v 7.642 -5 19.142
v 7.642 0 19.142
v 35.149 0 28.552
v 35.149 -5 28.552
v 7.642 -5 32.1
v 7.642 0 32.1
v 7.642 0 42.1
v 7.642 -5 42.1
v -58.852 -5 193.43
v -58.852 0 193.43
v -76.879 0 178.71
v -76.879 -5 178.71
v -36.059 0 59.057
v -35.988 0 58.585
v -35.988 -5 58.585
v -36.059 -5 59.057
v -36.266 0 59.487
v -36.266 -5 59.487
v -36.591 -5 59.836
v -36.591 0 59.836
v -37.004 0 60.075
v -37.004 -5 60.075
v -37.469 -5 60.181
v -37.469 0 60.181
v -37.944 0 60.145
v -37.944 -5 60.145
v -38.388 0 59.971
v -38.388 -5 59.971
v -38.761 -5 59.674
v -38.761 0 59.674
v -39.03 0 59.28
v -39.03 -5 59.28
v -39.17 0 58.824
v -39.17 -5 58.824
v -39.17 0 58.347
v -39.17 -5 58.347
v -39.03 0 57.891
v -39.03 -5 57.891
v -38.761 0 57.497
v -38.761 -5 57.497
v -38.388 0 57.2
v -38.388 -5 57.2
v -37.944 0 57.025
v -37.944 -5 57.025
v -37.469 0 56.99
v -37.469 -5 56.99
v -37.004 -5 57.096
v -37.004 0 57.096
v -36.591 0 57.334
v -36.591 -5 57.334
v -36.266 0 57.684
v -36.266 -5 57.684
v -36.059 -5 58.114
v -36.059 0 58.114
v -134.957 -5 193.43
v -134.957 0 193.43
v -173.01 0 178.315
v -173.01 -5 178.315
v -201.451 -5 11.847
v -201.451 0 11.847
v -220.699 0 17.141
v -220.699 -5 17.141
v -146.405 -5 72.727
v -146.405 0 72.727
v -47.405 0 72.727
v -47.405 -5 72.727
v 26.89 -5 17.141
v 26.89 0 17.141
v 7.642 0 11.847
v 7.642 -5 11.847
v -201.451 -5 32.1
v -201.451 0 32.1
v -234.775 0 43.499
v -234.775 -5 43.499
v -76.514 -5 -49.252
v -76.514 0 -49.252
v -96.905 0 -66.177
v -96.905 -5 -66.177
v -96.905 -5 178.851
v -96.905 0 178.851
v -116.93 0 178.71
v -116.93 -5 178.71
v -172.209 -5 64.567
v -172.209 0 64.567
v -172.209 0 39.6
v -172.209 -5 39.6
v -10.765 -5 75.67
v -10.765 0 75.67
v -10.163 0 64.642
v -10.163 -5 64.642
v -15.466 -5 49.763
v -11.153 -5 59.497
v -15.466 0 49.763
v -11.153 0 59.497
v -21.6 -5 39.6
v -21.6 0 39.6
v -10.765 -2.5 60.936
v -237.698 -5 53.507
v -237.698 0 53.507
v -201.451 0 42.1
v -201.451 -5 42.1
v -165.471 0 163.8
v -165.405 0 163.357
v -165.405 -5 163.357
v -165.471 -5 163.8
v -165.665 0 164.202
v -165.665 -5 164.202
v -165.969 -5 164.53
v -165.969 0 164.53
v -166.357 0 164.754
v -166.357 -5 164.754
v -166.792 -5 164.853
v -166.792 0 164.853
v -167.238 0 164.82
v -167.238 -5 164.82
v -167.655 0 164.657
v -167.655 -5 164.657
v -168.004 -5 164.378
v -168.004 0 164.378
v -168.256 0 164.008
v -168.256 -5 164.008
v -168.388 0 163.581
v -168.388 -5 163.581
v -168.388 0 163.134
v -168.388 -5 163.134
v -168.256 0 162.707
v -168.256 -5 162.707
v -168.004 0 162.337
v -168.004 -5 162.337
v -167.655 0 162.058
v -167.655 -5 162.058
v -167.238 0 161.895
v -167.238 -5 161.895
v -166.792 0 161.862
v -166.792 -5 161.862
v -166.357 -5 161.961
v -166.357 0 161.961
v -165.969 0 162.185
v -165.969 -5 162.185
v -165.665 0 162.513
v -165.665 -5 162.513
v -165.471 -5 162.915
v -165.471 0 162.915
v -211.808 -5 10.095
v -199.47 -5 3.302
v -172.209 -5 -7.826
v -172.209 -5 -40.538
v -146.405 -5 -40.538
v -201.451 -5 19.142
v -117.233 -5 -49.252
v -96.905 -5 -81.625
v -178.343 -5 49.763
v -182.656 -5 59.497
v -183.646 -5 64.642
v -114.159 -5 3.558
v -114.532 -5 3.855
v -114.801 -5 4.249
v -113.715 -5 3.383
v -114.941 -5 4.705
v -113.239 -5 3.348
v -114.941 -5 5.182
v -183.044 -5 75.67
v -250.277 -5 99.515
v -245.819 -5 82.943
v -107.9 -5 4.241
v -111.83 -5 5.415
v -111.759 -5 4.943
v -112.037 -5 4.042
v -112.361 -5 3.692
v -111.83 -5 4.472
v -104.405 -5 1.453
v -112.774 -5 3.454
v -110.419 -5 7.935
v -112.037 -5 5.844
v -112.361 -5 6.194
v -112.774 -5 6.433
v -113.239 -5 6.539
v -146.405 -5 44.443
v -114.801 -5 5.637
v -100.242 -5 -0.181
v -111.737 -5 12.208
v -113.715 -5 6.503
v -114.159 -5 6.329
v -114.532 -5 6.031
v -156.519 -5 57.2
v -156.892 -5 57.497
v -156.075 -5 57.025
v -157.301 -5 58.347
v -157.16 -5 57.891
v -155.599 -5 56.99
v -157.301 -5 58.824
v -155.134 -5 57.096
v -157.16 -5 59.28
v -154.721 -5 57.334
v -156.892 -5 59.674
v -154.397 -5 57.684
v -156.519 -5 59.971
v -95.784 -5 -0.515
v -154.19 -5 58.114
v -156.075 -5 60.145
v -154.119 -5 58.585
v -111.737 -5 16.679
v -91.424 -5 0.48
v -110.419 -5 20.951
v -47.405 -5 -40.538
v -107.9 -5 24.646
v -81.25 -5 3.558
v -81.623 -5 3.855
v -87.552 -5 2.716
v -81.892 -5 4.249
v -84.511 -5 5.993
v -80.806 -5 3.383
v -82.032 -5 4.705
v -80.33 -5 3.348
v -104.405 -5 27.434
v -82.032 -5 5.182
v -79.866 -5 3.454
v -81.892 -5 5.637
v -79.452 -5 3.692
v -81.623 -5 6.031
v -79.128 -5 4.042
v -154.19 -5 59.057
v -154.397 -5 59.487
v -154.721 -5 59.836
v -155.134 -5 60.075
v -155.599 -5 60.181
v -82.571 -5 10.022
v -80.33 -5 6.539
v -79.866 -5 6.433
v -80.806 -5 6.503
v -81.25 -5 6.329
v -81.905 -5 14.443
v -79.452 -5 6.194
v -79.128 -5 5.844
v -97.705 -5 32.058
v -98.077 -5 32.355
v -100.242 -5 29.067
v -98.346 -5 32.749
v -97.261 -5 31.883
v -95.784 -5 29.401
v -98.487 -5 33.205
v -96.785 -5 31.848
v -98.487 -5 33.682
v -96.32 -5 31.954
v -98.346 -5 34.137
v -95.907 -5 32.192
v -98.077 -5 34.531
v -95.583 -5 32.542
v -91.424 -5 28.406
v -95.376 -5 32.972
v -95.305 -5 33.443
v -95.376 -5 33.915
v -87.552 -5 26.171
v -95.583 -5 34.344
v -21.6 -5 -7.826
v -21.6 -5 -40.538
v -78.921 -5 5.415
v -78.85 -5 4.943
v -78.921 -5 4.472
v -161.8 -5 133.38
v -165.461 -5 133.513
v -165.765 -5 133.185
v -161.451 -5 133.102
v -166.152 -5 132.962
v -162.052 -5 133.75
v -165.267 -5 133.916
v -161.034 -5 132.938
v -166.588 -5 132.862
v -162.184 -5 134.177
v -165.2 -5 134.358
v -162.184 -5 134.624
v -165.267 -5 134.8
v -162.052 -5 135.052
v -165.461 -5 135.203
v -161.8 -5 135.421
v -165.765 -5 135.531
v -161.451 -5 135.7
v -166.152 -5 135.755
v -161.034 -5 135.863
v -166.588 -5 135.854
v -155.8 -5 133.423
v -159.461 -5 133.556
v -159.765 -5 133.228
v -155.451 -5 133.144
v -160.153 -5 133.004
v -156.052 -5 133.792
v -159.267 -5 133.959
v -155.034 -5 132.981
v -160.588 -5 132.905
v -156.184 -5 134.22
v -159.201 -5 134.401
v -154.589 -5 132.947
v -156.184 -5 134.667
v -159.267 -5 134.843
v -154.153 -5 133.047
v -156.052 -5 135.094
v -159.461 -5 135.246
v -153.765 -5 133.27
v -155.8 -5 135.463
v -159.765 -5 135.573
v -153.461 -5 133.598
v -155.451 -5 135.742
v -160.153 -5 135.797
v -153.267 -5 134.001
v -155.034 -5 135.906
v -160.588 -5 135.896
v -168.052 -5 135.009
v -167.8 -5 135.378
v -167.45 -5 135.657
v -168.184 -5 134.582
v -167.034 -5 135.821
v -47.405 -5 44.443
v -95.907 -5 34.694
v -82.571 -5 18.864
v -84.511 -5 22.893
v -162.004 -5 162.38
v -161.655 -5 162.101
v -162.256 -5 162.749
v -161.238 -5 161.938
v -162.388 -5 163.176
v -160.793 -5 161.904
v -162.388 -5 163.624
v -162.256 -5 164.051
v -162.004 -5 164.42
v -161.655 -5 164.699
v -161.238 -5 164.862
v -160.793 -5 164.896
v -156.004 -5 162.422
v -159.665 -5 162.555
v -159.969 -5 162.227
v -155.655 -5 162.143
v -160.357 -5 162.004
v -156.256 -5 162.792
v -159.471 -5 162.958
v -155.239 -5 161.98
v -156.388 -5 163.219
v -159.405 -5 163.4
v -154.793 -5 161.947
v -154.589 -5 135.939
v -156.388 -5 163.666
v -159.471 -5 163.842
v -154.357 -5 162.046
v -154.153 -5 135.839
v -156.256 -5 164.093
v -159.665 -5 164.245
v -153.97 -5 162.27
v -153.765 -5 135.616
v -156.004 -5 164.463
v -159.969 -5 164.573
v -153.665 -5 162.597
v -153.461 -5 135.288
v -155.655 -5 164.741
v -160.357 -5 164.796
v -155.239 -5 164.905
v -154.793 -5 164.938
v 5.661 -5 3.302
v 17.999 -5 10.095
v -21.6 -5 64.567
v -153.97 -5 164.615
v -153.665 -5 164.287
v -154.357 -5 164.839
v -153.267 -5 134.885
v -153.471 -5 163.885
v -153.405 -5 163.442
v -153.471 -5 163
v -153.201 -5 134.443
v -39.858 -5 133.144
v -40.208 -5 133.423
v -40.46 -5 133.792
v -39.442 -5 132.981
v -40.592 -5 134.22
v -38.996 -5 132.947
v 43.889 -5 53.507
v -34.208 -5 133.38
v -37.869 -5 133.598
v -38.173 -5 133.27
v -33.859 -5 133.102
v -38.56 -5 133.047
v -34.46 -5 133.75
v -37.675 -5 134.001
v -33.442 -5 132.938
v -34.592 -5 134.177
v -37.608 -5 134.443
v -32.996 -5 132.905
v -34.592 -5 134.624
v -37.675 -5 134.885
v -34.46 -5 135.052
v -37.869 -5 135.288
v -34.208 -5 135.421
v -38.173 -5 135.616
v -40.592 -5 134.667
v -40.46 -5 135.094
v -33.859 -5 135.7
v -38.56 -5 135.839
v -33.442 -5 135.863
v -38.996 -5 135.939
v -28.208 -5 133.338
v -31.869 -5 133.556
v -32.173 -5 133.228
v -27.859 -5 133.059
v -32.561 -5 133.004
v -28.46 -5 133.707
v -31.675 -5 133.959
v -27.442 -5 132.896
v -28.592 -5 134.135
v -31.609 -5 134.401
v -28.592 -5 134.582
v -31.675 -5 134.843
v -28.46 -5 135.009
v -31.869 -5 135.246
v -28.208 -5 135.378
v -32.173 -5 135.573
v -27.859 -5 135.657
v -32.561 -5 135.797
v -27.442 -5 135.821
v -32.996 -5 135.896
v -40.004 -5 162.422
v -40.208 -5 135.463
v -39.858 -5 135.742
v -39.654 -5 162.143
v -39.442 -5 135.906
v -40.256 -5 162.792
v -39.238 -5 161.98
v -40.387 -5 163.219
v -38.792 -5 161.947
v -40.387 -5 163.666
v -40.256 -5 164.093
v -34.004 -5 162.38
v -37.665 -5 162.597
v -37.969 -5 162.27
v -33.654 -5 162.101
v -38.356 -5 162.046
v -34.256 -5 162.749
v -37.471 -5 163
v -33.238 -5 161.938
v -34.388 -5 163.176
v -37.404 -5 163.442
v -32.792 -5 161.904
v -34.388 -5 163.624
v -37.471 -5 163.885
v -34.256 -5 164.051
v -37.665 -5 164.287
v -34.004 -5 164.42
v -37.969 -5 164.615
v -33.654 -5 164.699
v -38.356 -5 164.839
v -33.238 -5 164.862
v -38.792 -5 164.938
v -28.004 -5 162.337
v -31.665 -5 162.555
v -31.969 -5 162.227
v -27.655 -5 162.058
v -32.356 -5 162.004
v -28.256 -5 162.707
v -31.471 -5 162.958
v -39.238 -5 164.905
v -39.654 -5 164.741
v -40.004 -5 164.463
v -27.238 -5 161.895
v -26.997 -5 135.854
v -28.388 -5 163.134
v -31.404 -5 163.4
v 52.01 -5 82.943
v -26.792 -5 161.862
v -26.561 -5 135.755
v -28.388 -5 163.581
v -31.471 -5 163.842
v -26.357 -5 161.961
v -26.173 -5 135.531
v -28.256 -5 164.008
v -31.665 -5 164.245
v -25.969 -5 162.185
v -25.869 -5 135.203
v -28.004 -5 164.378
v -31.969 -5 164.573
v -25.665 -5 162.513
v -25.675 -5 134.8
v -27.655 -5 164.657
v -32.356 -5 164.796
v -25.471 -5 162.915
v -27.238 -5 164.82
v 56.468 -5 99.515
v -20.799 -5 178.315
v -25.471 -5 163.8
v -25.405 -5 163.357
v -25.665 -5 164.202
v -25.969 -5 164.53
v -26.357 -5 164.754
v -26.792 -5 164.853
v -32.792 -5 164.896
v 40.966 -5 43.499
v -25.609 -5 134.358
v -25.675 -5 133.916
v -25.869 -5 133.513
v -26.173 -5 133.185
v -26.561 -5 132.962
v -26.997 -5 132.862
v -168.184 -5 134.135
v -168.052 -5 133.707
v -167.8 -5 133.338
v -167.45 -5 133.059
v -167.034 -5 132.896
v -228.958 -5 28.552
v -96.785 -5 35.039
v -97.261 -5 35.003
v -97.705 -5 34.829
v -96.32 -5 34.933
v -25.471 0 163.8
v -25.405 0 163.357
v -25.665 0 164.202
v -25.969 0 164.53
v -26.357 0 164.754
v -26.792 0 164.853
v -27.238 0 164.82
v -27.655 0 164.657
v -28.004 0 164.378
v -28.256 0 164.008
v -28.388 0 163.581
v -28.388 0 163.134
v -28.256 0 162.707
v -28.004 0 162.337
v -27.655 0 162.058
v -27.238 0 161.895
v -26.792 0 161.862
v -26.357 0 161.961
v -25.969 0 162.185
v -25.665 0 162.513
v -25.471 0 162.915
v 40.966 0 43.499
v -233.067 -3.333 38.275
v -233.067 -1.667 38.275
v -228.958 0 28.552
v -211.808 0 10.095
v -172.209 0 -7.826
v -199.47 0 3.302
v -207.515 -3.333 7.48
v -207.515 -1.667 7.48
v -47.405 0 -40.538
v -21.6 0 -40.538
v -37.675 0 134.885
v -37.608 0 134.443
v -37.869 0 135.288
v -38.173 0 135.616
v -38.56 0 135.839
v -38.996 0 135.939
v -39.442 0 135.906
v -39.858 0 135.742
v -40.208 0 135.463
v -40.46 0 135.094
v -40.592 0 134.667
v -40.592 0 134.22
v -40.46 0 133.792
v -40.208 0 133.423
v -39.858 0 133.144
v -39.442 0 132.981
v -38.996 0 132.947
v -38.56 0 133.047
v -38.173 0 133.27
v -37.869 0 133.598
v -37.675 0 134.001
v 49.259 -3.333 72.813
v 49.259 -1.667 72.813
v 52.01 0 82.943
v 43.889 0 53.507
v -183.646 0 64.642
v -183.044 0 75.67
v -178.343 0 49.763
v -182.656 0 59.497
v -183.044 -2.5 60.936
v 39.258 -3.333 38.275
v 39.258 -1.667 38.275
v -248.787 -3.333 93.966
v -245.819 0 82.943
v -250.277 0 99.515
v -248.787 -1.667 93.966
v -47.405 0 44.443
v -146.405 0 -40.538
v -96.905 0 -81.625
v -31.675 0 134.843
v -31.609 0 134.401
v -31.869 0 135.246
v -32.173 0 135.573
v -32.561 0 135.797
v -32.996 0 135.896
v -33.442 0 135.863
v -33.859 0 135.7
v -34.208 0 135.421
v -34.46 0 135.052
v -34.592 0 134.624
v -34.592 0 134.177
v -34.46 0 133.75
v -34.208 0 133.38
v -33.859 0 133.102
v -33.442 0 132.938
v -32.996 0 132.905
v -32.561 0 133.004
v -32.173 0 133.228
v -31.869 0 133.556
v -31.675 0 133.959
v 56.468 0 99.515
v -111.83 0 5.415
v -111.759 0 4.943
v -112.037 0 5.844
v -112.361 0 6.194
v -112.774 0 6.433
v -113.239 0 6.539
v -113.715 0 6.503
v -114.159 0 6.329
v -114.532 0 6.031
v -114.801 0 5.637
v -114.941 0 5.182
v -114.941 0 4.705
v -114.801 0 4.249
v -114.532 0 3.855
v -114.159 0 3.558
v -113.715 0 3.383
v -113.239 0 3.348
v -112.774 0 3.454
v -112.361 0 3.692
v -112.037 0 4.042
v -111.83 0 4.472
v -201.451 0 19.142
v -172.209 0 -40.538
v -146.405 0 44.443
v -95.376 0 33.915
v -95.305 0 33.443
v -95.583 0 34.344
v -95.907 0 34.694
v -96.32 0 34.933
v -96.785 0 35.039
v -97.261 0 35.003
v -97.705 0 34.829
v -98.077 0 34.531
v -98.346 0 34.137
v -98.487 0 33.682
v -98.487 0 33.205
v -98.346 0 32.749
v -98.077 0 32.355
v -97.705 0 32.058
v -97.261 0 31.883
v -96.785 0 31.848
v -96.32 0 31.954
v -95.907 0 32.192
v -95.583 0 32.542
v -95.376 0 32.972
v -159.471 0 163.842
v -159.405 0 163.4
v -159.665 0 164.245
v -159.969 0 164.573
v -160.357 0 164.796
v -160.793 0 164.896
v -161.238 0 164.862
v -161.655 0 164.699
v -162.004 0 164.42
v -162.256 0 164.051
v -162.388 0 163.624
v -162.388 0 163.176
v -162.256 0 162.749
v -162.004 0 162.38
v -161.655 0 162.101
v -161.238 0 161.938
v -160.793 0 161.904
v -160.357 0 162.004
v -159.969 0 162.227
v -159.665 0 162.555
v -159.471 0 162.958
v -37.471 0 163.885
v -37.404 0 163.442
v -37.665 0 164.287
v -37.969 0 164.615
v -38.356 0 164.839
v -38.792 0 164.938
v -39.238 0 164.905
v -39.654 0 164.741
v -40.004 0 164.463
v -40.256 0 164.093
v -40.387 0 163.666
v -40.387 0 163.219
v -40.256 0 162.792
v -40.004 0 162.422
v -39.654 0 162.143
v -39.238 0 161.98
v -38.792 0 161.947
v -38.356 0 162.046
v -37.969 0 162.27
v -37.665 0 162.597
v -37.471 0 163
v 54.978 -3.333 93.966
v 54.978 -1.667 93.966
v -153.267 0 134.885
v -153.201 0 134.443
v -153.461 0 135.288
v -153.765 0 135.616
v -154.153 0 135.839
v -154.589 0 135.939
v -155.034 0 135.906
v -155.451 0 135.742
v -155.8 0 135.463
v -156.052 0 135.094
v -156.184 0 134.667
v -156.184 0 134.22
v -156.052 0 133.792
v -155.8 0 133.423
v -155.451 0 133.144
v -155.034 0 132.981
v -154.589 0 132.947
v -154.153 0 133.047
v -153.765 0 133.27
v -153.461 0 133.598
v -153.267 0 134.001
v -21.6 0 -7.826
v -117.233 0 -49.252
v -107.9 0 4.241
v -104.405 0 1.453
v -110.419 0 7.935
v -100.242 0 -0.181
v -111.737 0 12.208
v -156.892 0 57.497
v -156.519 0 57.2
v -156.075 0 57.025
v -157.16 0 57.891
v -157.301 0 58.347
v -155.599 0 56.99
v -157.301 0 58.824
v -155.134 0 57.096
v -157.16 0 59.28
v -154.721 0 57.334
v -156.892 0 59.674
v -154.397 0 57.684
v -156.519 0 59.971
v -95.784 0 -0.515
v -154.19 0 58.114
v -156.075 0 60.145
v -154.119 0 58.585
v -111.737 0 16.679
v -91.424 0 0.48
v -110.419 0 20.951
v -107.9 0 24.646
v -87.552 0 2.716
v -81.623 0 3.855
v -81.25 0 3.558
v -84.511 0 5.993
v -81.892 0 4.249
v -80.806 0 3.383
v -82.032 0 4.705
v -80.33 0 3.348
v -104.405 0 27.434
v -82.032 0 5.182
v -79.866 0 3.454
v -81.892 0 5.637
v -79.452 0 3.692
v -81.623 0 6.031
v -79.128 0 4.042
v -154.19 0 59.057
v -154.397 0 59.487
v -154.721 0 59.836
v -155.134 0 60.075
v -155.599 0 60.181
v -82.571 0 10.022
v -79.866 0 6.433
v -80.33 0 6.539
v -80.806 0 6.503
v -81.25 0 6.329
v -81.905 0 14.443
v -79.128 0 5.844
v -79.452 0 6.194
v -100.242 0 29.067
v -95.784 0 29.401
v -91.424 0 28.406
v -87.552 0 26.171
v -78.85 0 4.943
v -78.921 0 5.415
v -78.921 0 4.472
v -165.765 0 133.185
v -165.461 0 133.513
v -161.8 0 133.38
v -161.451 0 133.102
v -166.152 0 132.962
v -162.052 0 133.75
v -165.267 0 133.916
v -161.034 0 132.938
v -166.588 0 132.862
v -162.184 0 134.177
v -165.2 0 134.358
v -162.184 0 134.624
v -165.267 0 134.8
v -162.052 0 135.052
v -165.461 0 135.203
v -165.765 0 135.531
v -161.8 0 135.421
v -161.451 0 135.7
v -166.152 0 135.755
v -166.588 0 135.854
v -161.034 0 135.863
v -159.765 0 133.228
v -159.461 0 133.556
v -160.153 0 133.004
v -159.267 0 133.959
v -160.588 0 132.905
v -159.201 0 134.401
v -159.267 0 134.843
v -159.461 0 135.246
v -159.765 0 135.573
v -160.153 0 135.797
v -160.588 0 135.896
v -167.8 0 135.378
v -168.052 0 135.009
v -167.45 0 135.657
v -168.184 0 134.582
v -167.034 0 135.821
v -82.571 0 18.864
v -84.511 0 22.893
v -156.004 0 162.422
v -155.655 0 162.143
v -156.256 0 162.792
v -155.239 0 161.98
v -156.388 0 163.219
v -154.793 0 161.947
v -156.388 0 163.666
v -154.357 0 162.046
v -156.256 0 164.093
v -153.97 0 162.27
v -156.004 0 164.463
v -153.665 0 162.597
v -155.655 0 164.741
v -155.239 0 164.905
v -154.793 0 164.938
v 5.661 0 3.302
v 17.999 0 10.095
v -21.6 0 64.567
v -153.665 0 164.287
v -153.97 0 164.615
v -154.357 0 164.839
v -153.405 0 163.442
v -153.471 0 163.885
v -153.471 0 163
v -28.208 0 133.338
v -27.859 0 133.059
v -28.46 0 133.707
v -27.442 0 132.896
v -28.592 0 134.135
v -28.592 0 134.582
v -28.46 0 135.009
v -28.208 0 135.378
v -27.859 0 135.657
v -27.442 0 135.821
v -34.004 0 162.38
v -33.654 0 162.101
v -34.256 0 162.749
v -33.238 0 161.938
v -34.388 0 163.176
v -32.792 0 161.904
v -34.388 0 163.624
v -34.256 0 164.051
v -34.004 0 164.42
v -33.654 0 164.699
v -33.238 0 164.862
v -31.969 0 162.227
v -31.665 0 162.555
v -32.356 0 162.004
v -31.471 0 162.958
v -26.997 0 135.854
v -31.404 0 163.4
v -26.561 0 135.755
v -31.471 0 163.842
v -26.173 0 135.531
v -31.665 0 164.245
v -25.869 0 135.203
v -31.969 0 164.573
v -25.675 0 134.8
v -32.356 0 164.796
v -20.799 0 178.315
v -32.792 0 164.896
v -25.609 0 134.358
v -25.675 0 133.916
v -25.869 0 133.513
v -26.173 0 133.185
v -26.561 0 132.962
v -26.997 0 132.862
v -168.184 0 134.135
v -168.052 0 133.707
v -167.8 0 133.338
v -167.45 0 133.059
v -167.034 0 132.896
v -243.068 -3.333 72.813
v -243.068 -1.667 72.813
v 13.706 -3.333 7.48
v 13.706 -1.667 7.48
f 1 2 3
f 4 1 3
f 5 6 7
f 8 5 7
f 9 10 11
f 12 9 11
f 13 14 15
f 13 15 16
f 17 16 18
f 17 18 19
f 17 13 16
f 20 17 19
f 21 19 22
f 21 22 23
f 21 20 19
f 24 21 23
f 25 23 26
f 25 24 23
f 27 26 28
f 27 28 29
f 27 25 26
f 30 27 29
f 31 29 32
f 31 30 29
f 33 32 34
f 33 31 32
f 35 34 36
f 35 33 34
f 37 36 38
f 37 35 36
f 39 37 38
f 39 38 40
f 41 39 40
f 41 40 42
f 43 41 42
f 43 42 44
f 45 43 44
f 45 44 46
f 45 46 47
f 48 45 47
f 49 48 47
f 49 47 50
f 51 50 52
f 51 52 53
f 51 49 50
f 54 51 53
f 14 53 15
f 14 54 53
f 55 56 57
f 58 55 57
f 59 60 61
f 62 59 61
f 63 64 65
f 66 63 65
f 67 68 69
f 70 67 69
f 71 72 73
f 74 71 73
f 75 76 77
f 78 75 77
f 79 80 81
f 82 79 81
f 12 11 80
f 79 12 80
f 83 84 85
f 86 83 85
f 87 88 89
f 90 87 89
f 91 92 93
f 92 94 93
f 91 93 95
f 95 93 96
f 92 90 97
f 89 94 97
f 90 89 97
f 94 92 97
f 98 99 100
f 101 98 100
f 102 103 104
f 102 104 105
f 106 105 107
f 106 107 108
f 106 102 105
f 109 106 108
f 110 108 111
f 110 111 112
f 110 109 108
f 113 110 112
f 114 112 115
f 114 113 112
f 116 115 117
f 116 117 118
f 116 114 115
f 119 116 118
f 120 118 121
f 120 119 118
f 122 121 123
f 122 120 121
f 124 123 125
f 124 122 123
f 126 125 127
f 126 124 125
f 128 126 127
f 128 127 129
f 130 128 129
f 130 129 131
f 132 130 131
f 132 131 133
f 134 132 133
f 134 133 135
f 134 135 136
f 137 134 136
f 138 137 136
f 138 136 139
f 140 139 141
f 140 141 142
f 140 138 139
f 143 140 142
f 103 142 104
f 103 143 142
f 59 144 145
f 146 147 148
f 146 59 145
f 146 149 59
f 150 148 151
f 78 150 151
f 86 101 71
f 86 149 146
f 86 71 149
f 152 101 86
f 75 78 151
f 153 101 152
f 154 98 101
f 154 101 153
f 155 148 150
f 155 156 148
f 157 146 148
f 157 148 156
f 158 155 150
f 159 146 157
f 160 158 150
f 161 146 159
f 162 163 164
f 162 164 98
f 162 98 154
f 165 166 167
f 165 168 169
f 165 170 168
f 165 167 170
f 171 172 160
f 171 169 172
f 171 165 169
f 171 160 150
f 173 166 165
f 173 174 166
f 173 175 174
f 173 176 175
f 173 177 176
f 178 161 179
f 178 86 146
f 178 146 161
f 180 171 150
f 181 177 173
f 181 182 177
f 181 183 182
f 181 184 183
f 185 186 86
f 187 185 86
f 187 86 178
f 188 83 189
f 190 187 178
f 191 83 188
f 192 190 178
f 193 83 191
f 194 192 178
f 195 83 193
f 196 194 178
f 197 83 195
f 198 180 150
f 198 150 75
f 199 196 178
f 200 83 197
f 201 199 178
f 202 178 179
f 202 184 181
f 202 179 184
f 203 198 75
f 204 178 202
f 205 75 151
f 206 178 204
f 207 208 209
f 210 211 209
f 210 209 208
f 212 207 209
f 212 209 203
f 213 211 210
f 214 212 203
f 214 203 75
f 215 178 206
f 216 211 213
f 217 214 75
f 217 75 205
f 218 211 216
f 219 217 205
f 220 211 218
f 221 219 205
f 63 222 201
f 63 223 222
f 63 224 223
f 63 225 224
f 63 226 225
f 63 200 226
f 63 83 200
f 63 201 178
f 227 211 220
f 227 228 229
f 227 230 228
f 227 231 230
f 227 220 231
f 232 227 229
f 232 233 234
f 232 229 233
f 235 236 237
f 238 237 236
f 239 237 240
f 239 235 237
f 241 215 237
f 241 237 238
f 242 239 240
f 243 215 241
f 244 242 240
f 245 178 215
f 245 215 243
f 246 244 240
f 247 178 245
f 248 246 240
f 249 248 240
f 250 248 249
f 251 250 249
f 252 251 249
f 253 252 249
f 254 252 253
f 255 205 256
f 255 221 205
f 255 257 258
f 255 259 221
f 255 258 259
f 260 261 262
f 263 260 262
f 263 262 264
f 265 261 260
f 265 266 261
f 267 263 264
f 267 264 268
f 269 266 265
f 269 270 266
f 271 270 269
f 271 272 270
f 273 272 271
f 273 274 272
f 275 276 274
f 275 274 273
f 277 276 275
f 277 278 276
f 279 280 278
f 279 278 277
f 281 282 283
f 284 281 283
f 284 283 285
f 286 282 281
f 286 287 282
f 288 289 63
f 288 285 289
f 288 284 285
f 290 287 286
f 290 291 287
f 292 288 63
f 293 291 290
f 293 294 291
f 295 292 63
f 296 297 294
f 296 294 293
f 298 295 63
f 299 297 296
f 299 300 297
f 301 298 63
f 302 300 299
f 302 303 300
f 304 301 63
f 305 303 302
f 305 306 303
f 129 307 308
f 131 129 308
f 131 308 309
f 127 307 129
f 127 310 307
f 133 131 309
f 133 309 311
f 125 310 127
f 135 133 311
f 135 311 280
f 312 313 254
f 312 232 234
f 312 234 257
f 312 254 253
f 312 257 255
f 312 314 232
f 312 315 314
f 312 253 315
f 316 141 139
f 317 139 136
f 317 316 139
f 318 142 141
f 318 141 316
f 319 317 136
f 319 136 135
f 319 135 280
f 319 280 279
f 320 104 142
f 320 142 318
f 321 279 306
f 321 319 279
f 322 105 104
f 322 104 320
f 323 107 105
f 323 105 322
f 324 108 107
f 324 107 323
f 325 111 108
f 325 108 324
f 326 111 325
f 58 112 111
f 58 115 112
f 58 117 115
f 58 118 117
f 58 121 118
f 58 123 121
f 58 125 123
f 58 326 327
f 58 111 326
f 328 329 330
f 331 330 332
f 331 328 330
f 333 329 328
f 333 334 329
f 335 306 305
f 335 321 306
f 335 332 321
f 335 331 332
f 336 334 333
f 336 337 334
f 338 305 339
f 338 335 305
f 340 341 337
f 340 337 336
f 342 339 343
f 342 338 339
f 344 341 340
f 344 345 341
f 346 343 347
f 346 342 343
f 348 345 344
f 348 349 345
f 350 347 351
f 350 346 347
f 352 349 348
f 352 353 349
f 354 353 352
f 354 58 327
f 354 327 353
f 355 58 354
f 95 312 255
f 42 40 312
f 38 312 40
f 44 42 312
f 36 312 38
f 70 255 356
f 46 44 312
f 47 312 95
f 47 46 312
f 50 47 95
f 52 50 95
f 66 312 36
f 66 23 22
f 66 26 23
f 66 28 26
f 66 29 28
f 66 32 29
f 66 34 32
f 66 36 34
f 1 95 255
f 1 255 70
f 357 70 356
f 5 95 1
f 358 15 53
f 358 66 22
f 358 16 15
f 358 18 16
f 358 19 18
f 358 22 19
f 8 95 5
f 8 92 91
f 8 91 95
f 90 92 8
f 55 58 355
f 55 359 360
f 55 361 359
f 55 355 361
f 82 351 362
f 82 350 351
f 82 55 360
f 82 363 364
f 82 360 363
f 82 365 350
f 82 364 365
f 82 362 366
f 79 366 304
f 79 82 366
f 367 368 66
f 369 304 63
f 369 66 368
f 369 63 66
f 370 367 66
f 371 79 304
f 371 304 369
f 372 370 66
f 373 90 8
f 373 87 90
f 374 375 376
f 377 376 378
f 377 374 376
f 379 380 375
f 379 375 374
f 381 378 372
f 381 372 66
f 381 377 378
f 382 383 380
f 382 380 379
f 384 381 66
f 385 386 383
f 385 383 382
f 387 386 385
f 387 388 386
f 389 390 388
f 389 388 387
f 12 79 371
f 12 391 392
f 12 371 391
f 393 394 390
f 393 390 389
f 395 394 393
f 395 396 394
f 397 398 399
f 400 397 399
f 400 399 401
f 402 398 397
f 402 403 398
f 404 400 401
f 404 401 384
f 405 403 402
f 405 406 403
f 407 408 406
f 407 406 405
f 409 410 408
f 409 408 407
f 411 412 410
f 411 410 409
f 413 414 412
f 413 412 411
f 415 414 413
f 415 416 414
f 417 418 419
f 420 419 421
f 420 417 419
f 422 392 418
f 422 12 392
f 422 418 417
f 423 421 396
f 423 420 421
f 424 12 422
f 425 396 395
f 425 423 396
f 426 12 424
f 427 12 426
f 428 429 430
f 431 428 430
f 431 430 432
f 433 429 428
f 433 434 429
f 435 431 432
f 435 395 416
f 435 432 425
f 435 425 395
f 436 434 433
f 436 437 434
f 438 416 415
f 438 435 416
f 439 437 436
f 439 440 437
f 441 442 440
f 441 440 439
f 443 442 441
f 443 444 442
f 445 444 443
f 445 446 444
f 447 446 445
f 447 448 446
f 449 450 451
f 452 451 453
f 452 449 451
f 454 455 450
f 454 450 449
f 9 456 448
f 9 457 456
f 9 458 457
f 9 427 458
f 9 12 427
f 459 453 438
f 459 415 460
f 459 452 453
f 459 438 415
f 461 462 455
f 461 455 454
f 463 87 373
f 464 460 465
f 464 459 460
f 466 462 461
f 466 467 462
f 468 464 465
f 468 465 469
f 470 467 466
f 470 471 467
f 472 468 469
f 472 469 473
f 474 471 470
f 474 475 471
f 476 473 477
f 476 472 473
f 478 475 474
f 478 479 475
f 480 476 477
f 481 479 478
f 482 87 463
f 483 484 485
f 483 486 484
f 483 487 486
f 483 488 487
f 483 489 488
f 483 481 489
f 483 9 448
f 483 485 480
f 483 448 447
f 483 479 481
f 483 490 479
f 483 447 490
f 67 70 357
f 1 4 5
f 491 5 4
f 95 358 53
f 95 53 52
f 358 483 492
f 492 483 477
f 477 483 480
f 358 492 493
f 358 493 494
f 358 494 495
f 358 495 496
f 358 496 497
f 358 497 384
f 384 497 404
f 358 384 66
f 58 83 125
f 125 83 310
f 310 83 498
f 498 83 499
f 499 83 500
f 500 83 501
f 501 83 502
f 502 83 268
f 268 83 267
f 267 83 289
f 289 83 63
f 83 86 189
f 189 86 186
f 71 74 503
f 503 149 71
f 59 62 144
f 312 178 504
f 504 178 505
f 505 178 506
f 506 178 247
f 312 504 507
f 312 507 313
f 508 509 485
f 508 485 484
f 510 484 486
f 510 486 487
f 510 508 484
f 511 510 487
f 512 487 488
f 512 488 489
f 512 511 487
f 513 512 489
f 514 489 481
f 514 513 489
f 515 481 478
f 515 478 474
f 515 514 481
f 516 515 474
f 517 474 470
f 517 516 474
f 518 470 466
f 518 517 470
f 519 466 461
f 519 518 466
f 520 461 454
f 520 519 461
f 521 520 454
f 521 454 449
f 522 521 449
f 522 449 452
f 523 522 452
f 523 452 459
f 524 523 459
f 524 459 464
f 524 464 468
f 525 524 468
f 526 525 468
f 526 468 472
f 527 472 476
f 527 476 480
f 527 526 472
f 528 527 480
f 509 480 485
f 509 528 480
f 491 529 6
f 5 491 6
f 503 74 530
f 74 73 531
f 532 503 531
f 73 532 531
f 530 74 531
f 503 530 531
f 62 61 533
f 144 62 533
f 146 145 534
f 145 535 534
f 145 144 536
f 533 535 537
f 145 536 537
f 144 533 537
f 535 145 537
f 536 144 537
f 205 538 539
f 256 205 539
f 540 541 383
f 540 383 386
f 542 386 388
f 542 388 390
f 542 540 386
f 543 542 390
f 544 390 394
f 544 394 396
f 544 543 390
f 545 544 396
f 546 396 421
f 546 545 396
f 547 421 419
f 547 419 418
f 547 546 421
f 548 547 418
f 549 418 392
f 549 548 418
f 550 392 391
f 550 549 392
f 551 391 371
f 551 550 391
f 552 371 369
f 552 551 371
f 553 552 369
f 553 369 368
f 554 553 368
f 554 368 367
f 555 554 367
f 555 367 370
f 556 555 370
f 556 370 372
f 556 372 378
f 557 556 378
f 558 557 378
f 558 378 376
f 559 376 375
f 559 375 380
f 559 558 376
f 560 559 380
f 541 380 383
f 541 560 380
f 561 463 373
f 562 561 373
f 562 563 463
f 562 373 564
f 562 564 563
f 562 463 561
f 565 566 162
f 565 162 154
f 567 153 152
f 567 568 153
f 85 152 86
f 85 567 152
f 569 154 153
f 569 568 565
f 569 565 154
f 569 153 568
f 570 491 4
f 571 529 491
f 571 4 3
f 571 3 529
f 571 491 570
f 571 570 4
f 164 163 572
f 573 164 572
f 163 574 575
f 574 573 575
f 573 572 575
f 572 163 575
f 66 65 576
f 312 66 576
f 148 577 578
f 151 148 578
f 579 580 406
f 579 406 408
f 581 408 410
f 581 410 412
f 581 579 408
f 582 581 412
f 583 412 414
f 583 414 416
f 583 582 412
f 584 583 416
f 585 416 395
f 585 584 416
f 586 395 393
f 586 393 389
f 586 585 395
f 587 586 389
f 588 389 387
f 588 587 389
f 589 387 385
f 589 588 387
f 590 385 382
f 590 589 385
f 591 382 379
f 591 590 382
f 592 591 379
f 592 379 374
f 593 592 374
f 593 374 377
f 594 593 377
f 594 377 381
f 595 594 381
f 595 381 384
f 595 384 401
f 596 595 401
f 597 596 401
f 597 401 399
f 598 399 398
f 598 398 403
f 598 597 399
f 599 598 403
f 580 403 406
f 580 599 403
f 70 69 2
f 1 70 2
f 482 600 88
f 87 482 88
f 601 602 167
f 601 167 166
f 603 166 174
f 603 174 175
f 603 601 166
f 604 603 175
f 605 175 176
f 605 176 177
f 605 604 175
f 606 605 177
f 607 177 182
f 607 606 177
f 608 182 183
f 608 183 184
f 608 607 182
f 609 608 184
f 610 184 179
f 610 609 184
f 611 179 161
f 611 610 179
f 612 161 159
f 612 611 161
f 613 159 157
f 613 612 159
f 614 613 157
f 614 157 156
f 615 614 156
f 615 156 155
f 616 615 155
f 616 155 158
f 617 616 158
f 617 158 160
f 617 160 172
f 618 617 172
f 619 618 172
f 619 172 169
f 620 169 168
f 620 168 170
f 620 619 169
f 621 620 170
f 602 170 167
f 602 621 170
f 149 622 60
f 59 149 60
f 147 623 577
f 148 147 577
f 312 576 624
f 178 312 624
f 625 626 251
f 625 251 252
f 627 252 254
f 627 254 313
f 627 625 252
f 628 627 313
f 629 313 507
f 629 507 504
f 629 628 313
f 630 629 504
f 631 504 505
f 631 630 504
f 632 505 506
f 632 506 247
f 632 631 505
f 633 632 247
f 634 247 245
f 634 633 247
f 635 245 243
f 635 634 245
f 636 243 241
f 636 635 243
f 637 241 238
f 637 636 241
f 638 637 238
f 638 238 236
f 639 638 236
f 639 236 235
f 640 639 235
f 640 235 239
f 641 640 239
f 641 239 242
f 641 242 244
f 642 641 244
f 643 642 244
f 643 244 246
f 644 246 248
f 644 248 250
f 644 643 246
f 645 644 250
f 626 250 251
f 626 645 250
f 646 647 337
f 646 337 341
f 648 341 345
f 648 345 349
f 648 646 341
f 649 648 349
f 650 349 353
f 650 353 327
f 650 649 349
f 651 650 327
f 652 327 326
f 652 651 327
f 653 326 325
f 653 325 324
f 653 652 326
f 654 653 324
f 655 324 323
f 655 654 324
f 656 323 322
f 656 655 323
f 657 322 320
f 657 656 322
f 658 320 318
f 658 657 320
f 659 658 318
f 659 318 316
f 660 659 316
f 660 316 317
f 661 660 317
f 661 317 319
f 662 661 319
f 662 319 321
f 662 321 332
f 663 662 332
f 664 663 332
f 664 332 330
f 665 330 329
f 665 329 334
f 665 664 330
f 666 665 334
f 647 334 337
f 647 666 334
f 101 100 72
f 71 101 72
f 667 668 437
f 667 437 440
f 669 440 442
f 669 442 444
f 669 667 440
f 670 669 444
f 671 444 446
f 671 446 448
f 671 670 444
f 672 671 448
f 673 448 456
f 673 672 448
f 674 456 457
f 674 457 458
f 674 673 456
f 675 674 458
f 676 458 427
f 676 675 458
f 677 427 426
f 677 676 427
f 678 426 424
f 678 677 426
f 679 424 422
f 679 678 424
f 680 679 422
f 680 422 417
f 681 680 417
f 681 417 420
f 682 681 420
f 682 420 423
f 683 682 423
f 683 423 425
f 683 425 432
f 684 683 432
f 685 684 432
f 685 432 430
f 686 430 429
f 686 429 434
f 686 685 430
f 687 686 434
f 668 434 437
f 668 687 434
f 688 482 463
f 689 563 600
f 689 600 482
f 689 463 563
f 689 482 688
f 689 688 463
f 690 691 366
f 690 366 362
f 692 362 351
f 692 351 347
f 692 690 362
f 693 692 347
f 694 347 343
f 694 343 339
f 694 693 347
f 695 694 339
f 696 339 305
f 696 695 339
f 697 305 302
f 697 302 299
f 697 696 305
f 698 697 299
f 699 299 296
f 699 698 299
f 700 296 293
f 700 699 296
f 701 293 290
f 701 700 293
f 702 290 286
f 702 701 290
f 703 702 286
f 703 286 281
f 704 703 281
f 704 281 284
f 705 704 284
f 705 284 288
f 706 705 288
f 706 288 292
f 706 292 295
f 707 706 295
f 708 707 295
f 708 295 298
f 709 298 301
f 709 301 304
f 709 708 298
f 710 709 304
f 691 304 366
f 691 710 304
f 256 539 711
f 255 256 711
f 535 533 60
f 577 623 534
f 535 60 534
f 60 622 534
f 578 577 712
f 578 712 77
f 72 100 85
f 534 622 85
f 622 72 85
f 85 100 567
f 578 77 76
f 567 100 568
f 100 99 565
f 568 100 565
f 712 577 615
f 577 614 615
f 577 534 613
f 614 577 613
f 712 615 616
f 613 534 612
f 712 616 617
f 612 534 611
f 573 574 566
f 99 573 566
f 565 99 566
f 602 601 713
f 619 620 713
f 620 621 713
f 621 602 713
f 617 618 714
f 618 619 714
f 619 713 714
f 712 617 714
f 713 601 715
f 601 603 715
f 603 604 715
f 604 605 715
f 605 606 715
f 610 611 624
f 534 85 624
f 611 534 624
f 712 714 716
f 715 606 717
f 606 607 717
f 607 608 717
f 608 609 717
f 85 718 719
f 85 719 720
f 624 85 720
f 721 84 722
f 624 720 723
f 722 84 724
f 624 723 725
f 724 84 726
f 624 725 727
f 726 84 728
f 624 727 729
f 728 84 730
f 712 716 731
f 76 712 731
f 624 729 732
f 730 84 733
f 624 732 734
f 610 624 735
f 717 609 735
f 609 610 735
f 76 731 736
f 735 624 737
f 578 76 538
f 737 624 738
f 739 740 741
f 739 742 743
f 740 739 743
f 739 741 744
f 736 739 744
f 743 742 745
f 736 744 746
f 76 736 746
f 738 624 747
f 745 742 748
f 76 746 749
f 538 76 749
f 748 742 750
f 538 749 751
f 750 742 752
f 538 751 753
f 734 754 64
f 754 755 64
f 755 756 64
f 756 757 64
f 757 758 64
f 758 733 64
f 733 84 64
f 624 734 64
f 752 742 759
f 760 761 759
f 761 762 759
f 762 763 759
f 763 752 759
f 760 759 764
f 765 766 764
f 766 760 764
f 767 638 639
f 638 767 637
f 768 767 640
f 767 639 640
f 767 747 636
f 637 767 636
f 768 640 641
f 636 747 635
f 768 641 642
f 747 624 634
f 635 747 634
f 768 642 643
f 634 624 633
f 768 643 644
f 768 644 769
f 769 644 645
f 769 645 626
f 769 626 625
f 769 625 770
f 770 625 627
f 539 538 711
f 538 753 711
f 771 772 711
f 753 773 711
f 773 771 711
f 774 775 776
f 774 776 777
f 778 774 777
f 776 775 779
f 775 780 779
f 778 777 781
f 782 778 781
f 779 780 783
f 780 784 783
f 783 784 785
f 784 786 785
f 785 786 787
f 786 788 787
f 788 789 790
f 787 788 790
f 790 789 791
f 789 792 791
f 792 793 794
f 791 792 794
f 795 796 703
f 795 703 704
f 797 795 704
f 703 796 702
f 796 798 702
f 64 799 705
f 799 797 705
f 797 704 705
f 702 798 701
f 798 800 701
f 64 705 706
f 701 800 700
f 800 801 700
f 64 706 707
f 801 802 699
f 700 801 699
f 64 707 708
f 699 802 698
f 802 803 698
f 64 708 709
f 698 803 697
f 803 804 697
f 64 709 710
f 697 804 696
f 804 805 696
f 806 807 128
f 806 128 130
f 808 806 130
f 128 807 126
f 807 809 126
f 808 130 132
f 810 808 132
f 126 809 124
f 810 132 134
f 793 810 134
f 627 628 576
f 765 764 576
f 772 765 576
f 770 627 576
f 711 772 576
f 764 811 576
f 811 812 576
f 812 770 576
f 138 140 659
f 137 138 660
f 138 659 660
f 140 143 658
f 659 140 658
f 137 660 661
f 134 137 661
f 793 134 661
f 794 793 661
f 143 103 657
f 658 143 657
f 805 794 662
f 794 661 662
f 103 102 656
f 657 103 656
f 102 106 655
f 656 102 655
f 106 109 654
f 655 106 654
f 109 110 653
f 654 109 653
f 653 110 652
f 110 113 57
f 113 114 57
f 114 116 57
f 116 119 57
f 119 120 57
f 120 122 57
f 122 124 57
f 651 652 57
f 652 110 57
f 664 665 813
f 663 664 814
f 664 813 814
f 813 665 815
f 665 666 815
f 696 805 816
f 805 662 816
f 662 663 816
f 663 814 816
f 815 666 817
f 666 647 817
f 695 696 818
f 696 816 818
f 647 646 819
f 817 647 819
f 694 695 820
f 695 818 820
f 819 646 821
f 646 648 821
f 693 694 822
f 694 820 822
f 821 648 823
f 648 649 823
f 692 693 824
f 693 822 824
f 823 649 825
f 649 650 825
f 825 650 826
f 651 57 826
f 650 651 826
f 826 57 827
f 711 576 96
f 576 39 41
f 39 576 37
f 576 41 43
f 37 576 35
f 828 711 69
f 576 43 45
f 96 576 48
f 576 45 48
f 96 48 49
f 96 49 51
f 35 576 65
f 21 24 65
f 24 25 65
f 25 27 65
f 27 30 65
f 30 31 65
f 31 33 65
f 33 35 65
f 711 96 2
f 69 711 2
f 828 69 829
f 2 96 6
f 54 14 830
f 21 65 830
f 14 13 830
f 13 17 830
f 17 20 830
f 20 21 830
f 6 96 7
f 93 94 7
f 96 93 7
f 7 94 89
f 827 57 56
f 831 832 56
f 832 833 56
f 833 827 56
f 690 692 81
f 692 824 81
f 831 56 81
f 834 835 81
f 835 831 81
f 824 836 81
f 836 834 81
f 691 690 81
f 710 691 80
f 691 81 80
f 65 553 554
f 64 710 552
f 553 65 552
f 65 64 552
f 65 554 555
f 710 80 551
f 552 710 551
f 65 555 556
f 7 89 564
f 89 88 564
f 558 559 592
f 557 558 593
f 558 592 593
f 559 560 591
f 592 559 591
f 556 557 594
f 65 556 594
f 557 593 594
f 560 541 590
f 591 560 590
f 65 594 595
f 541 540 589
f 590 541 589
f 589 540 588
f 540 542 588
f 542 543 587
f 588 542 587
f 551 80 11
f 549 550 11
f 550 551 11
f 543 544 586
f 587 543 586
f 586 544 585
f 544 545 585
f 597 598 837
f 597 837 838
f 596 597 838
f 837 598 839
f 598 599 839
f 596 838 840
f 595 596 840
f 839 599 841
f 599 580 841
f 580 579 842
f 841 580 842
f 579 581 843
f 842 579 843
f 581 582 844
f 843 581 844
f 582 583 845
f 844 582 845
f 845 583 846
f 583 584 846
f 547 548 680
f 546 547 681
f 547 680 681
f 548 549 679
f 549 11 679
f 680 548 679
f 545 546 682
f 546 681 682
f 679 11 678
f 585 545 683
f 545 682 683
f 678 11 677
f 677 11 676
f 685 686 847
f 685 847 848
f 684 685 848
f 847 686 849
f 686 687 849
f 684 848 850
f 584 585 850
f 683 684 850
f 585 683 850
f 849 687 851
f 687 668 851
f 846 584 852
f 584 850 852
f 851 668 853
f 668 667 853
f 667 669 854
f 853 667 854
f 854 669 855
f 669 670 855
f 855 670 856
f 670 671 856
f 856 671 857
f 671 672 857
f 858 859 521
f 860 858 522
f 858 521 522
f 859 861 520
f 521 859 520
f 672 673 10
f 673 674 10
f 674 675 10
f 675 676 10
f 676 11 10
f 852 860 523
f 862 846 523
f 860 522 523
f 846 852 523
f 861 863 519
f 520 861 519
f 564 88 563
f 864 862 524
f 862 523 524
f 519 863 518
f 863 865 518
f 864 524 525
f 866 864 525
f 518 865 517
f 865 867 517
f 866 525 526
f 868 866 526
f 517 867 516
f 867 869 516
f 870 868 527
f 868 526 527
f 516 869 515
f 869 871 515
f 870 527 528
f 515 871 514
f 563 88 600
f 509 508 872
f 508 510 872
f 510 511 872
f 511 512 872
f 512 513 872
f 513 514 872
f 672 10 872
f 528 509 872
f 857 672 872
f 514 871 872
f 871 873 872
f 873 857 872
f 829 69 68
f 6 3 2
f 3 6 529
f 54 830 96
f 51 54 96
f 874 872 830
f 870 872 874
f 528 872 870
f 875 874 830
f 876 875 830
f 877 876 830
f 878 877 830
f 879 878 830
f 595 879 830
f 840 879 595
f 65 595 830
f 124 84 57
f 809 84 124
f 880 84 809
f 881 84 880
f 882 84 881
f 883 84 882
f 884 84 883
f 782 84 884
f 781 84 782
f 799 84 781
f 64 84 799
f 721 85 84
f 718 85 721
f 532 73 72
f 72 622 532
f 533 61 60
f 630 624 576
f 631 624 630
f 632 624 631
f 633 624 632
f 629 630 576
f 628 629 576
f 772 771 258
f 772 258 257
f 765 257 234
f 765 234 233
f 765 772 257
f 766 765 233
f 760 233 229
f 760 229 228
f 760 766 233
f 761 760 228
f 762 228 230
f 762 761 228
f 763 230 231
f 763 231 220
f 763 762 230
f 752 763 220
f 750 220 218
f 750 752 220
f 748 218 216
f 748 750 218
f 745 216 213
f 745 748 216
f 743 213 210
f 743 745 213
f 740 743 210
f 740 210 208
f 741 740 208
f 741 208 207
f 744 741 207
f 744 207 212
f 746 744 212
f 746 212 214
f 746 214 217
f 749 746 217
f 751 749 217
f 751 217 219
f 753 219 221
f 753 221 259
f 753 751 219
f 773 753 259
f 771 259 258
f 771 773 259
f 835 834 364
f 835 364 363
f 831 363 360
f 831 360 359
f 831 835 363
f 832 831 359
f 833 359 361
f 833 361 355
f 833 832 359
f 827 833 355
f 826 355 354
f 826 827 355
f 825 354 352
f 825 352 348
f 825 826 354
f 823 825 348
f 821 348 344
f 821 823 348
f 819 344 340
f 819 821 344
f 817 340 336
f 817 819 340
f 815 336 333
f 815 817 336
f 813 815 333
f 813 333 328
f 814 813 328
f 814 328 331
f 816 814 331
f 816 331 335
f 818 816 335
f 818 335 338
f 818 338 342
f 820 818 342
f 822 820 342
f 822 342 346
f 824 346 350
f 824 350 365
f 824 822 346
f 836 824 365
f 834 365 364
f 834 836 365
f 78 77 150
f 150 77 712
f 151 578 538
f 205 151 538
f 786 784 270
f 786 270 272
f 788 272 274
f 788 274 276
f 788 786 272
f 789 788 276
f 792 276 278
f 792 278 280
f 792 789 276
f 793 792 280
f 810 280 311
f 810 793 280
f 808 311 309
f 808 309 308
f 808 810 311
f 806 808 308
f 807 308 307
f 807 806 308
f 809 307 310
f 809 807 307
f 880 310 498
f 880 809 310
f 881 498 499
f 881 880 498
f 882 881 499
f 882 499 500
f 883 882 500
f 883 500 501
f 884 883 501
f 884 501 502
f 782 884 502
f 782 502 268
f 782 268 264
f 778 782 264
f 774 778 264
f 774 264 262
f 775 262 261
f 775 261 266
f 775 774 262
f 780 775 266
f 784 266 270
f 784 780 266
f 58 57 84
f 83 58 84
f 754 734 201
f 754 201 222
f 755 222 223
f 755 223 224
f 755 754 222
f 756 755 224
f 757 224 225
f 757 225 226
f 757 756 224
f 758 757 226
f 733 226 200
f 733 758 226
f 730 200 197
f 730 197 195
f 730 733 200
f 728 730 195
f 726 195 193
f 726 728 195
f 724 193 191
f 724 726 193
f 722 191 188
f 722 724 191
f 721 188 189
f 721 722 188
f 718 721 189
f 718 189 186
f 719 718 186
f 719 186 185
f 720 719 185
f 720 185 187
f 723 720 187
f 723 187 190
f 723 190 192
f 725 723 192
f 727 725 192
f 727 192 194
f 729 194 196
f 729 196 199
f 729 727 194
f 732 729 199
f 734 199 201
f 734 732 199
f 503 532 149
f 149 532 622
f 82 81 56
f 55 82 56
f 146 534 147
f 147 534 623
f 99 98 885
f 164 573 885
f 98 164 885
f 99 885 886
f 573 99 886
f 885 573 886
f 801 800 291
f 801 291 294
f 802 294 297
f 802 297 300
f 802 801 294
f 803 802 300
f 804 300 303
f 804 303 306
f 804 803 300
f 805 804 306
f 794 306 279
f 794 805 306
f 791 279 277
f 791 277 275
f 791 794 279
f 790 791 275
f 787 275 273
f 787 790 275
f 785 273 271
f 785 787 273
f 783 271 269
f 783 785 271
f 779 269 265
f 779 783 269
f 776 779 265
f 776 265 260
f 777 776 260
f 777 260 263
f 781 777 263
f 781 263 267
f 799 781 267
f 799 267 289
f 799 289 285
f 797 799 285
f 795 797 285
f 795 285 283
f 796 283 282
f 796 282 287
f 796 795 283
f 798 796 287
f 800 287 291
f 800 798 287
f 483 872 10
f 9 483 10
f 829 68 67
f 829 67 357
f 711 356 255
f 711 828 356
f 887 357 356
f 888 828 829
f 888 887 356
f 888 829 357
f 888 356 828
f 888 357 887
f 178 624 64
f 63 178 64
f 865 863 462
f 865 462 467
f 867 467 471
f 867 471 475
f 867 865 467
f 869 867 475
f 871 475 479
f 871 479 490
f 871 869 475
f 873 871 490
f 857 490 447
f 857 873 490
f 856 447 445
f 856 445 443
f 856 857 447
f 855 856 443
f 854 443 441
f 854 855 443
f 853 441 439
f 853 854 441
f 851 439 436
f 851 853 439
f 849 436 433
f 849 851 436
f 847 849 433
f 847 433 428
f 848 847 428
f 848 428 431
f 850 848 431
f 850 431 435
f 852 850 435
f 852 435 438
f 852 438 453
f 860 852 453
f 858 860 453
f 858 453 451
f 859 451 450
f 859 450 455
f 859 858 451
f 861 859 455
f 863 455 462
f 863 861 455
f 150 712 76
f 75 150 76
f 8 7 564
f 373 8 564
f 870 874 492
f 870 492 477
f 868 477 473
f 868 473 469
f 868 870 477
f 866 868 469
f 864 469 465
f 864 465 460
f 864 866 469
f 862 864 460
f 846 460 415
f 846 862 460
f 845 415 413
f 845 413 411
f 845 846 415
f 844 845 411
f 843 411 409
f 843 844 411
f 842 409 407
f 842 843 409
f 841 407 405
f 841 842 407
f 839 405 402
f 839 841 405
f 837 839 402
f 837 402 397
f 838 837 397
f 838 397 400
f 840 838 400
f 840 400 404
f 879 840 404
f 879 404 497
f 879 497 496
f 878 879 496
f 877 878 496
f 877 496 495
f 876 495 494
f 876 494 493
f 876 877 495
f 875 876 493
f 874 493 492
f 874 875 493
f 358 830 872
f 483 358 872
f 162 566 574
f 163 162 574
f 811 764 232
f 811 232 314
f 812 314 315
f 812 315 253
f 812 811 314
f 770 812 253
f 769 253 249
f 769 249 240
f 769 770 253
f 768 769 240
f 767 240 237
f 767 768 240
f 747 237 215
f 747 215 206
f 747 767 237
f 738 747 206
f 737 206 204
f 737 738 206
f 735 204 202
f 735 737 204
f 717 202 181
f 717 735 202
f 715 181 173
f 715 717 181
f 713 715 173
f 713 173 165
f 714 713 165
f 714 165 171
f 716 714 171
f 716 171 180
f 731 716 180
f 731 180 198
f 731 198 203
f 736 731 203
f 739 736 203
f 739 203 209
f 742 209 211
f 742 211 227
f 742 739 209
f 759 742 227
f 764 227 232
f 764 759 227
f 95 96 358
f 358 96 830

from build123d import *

# Parameters (mm, degrees)
F0_R     = 1.6
F0_R_2   = 15
F0_R_3   = 1.5
F1_DEPTH = 5


# Not quite as in the source:
# - ends of sketch curves that miss each other by under 0.0002 mm in the source are joined


with BuildPart() as f1:
    # F0 (on Front) → F1 (new body)
    with BuildSketch(Plane.XZ):
        Polygon((-96.9045388699, -40.5384600163), (-146.4045388699, -40.5384600163), (-96.9045388699, -81.6254615784), (-47.4045388699, -40.5384600163), align=None)
        Polygon((-96.9045388699, -66.1772739545), (-117.2328144312, -49.2524243891), (-76.514147222, -49.2524243891), align=None, mode=Mode.SUBTRACT)
        Polygon((-116.9301321116, 178.7101170527), (-173.0099775762, 178.315364934), (-172.209293991, 64.5674973527), (-172.209293991, 39.6003018865), (-172.209293991, -7.8263543546), (-172.209293991, -40.5384600163), (-146.4045388699, -40.5384600163), (-96.9045388699, -40.5384600163), (-47.4045388699, -40.5384600163), (-21.5997837488, -40.5384600163), (-21.5997837488, -7.8263543546), (-21.5997837488, 39.6003018865), (-21.5997837488, 64.5674973527), (-20.7991001636, 178.315364934), (-76.8789456281, 178.7101170527), (-96.9045388699, 178.851079377), align=None)
        with Locations((-113.3590215418, 4.9431557872)):
            Circle(F0_R, mode=Mode.SUBTRACT)
        with Locations((-96.9045388699, 14.4431557872)):
            Circle(F0_R_2, mode=Mode.SUBTRACT)
        with Locations((-96.9045388699, 33.4431557872)):
            Circle(F0_R, mode=Mode.SUBTRACT)
        with Locations((-80.450056198, 4.9431557872)):
            Circle(F0_R, mode=Mode.SUBTRACT)
        with Locations((-166.7004097796, 134.3582146961)):
            Circle(F0_R_3, mode=Mode.SUBTRACT)
        with Locations((-160.7005600937, 134.4006852416)):
            Circle(F0_R_3, mode=Mode.SUBTRACT)
        with Locations((-154.7007104079, 134.4431557872)):
            Circle(F0_R_3, mode=Mode.SUBTRACT)
        with Locations((-166.9045388699, 163.3574962616)):
            Circle(F0_R_3, mode=Mode.SUBTRACT)
        with Locations((-160.904689184, 163.3999668071)):
            Circle(F0_R_3, mode=Mode.SUBTRACT)
        with Locations((-154.9048394982, 163.4424373527)):
            Circle(F0_R_3, mode=Mode.SUBTRACT)
        Polygon((-160.5466744936, 58.5852914109), (-146.4045388699, 72.7274270346), (-47.4045388699, 72.7274270346), (-33.2624032461, 58.5852914109), (-47.4045388699, 44.4431557872), (-146.4045388699, 44.4431557872), align=None, mode=Mode.SUBTRACT)
        with Locations((-39.1083673318, 134.4431557872)):
            Circle(F0_R_3, mode=Mode.SUBTRACT)
        with Locations((-33.108517646, 134.4006852416)):
            Circle(F0_R_3, mode=Mode.SUBTRACT)
        with Locations((-27.1086679602, 134.3582146961)):
            Circle(F0_R_3, mode=Mode.SUBTRACT)
        with Locations((-38.9042382416, 163.4424373527)):
            Circle(F0_R_3, mode=Mode.SUBTRACT)
        with Locations((-32.9043885557, 163.3999668071)):
            Circle(F0_R_3, mode=Mode.SUBTRACT)
        with Locations((-26.9045388699, 163.3574962616)):
            Circle(F0_R_3, mode=Mode.SUBTRACT)
        with BuildLine():
            add(Edge.make_bspline(
                [(-10.7653314617, 75.6704937657), (-10.1423011883, 70.9060238986), (-8.7253114516, 60.0699454768), (-16.9765192292, 46.9510213145), (-21.5997880701, 39.6003018865)],
                knots=[0, 0, 0, 0, 0.4396858053, 1, 1, 1, 1], degree=3))
            Line((-21.5997880701, 39.6003018865), (-21.5997837488, -7.8263543546))
            add(Edge.make_bspline(
                [(26.8901133537, 17.1408411115), (16.0887779237, 6.4091763607), (-2.7555050732, -0.708588997), (-21.5997837488, -7.8263543546)],
                knots=[0.6427998281, 0.6427998281, 0.6427998281, 0.6427998281, 1, 1, 1, 1], degree=3))
            Line((26.8901133537, 17.1408411115), (7.6417172557, 11.8470894728))
            Line((7.6417172557, 11.8470894728), (7.6417172557, 19.1424891602))
            Line((7.6417172557, 19.1424891602), (35.1491589972, 28.5522722191))
            add(Edge.make_bspline(
                [(40.9662291467, 43.4994469848), (39.3215463775, 38.1621436215), (37.5379634129, 33.1572861433), (35.1491589972, 28.5522722191)],
                knots=[0.4005507879, 0.4005507879, 0.4005507879, 0.4005507879, 0.528058188, 0.528058188, 0.528058188, 0.528058188], degree=3))
            Line((40.9662291467, 43.4994469848), (7.6417172557, 32.0997526626))
            Line((7.6417172557, 32.0997526626), (7.6417172557, 42.0997526626))
            Line((7.6417172557, 42.0997526626), (43.8890115662, 53.5073665746))
            add(Edge.make_bspline(
                [(52.0098697503, 82.9429342223), (49.2436269652, 72.7066022993), (46.514808756, 62.7382046066), (43.8890115662, 53.5073665746)],
                knots=[0.1175634385, 0.1175634385, 0.1175634385, 0.1175634385, 0.3236243824, 0.3236243824, 0.3236243824, 0.3236243824], degree=3))
            add(Edge.make_bspline(
                [(56.4675719729, 99.5147182414), (54.9776571845, 93.9620524152), (53.4884176136, 88.4142206812), (52.0098697503, 82.9429342223)],
                knots=[0.0074245274, 0.0074245274, 0.0074245274, 0.0074245274, 0.1175634385, 0.1175634385, 0.1175634385, 0.1175634385], degree=3))
            Line((56.4675719729, 99.5147182414), (-10.7653314617, 75.6704937657))
        make_face()
        with BuildLine():
            Line((-172.209293991, -7.8263543546), (-172.209293991, 39.6003018865))
            add(Edge.make_bspline(
                [(-183.043746278, 75.6704937657), (-183.6667765514, 70.9060238986), (-185.0837662881, 60.0699454768), (-176.8325585105, 46.9510213145), (-172.209293991, 39.6003018865)],
                knots=[0, 0, 0, 0, 0.4396858053, 1, 1, 1, 1], degree=3))
            Line((-183.043746278, 75.6704937657), (-250.2766497126, 99.5147182414))
            add(Edge.make_bspline(
                [(-250.2766497126, 99.5147182414), (-248.7867349243, 93.9620524152), (-247.2974953533, 88.4142206812), (-245.81894749, 82.9429342223)],
                knots=[0.0074245274, 0.0074245274, 0.0074245274, 0.0074245274, 0.1175634385, 0.1175634385, 0.1175634385, 0.1175634385], degree=3))
            add(Edge.make_bspline(
                [(-245.81894749, 82.9429342223), (-243.0527047049, 72.7066022993), (-240.3238864957, 62.7382046066), (-237.6980893059, 53.5073665746)],
                knots=[0.1175634385, 0.1175634385, 0.1175634385, 0.1175634385, 0.3236243824, 0.3236243824, 0.3236243824, 0.3236243824], degree=3))
            Line((-237.6980893059, 53.5073665746), (-201.4507949954, 42.0997526626))
            Line((-201.4507949954, 42.0997526626), (-201.4507949954, 32.0997526626))
            Line((-201.4507949954, 32.0997526626), (-234.7753068864, 43.4994469848))
            add(Edge.make_bspline(
                [(-234.7753068864, 43.4994469848), (-233.1306241172, 38.1621436215), (-231.3470411526, 33.1572861433), (-228.9582367369, 28.5522722191)],
                knots=[0.4005507879, 0.4005507879, 0.4005507879, 0.4005507879, 0.528058188, 0.528058188, 0.528058188, 0.528058188], degree=3))
            Line((-228.9582367369, 28.5522722191), (-201.4507949954, 19.1424891602))
            Line((-201.4507949954, 19.1424891602), (-201.4507949954, 11.8470894728))
            Line((-201.4507949954, 11.8470894728), (-220.6991910934, 17.1408411115))
            add(Edge.make_bspline(
                [(-220.6991910934, 17.1408411115), (-209.8978556634, 6.4091763607), (-191.0535726665, -0.708588997), (-172.209293991, -7.8263543546)],
                knots=[0.6427998281, 0.6427998281, 0.6427998281, 0.6427998281, 1, 1, 1, 1], degree=3))
        make_face()
        Polygon((-146.4045388699, 44.4431557872), (-146.4045388699, 72.7274270346), (-160.5466744936, 58.5852914109), align=None)
        with Locations((-155.7186983824, 58.5852914109)):
            Circle(F0_R, mode=Mode.SUBTRACT)
        Polygon((-33.2624032461, 58.5852914109), (-47.4045388699, 72.7274270346), (-47.4045388699, 44.4431557872), align=None)
        with Locations((-37.5883497596, 58.5852914109)):
            Circle(F0_R, mode=Mode.SUBTRACT)
        Polygon((-134.957258223, 193.4304237366), (-173.0099775762, 178.315364934), (-116.9301321116, 178.7101170527), align=None)
        Polygon((-58.8518195167, 193.4304237366), (-76.8789456281, 178.7101170527), (-20.7991001636, 178.315364934), align=None)
    extrude(amount=F1_DEPTH)


solid = f1.part
